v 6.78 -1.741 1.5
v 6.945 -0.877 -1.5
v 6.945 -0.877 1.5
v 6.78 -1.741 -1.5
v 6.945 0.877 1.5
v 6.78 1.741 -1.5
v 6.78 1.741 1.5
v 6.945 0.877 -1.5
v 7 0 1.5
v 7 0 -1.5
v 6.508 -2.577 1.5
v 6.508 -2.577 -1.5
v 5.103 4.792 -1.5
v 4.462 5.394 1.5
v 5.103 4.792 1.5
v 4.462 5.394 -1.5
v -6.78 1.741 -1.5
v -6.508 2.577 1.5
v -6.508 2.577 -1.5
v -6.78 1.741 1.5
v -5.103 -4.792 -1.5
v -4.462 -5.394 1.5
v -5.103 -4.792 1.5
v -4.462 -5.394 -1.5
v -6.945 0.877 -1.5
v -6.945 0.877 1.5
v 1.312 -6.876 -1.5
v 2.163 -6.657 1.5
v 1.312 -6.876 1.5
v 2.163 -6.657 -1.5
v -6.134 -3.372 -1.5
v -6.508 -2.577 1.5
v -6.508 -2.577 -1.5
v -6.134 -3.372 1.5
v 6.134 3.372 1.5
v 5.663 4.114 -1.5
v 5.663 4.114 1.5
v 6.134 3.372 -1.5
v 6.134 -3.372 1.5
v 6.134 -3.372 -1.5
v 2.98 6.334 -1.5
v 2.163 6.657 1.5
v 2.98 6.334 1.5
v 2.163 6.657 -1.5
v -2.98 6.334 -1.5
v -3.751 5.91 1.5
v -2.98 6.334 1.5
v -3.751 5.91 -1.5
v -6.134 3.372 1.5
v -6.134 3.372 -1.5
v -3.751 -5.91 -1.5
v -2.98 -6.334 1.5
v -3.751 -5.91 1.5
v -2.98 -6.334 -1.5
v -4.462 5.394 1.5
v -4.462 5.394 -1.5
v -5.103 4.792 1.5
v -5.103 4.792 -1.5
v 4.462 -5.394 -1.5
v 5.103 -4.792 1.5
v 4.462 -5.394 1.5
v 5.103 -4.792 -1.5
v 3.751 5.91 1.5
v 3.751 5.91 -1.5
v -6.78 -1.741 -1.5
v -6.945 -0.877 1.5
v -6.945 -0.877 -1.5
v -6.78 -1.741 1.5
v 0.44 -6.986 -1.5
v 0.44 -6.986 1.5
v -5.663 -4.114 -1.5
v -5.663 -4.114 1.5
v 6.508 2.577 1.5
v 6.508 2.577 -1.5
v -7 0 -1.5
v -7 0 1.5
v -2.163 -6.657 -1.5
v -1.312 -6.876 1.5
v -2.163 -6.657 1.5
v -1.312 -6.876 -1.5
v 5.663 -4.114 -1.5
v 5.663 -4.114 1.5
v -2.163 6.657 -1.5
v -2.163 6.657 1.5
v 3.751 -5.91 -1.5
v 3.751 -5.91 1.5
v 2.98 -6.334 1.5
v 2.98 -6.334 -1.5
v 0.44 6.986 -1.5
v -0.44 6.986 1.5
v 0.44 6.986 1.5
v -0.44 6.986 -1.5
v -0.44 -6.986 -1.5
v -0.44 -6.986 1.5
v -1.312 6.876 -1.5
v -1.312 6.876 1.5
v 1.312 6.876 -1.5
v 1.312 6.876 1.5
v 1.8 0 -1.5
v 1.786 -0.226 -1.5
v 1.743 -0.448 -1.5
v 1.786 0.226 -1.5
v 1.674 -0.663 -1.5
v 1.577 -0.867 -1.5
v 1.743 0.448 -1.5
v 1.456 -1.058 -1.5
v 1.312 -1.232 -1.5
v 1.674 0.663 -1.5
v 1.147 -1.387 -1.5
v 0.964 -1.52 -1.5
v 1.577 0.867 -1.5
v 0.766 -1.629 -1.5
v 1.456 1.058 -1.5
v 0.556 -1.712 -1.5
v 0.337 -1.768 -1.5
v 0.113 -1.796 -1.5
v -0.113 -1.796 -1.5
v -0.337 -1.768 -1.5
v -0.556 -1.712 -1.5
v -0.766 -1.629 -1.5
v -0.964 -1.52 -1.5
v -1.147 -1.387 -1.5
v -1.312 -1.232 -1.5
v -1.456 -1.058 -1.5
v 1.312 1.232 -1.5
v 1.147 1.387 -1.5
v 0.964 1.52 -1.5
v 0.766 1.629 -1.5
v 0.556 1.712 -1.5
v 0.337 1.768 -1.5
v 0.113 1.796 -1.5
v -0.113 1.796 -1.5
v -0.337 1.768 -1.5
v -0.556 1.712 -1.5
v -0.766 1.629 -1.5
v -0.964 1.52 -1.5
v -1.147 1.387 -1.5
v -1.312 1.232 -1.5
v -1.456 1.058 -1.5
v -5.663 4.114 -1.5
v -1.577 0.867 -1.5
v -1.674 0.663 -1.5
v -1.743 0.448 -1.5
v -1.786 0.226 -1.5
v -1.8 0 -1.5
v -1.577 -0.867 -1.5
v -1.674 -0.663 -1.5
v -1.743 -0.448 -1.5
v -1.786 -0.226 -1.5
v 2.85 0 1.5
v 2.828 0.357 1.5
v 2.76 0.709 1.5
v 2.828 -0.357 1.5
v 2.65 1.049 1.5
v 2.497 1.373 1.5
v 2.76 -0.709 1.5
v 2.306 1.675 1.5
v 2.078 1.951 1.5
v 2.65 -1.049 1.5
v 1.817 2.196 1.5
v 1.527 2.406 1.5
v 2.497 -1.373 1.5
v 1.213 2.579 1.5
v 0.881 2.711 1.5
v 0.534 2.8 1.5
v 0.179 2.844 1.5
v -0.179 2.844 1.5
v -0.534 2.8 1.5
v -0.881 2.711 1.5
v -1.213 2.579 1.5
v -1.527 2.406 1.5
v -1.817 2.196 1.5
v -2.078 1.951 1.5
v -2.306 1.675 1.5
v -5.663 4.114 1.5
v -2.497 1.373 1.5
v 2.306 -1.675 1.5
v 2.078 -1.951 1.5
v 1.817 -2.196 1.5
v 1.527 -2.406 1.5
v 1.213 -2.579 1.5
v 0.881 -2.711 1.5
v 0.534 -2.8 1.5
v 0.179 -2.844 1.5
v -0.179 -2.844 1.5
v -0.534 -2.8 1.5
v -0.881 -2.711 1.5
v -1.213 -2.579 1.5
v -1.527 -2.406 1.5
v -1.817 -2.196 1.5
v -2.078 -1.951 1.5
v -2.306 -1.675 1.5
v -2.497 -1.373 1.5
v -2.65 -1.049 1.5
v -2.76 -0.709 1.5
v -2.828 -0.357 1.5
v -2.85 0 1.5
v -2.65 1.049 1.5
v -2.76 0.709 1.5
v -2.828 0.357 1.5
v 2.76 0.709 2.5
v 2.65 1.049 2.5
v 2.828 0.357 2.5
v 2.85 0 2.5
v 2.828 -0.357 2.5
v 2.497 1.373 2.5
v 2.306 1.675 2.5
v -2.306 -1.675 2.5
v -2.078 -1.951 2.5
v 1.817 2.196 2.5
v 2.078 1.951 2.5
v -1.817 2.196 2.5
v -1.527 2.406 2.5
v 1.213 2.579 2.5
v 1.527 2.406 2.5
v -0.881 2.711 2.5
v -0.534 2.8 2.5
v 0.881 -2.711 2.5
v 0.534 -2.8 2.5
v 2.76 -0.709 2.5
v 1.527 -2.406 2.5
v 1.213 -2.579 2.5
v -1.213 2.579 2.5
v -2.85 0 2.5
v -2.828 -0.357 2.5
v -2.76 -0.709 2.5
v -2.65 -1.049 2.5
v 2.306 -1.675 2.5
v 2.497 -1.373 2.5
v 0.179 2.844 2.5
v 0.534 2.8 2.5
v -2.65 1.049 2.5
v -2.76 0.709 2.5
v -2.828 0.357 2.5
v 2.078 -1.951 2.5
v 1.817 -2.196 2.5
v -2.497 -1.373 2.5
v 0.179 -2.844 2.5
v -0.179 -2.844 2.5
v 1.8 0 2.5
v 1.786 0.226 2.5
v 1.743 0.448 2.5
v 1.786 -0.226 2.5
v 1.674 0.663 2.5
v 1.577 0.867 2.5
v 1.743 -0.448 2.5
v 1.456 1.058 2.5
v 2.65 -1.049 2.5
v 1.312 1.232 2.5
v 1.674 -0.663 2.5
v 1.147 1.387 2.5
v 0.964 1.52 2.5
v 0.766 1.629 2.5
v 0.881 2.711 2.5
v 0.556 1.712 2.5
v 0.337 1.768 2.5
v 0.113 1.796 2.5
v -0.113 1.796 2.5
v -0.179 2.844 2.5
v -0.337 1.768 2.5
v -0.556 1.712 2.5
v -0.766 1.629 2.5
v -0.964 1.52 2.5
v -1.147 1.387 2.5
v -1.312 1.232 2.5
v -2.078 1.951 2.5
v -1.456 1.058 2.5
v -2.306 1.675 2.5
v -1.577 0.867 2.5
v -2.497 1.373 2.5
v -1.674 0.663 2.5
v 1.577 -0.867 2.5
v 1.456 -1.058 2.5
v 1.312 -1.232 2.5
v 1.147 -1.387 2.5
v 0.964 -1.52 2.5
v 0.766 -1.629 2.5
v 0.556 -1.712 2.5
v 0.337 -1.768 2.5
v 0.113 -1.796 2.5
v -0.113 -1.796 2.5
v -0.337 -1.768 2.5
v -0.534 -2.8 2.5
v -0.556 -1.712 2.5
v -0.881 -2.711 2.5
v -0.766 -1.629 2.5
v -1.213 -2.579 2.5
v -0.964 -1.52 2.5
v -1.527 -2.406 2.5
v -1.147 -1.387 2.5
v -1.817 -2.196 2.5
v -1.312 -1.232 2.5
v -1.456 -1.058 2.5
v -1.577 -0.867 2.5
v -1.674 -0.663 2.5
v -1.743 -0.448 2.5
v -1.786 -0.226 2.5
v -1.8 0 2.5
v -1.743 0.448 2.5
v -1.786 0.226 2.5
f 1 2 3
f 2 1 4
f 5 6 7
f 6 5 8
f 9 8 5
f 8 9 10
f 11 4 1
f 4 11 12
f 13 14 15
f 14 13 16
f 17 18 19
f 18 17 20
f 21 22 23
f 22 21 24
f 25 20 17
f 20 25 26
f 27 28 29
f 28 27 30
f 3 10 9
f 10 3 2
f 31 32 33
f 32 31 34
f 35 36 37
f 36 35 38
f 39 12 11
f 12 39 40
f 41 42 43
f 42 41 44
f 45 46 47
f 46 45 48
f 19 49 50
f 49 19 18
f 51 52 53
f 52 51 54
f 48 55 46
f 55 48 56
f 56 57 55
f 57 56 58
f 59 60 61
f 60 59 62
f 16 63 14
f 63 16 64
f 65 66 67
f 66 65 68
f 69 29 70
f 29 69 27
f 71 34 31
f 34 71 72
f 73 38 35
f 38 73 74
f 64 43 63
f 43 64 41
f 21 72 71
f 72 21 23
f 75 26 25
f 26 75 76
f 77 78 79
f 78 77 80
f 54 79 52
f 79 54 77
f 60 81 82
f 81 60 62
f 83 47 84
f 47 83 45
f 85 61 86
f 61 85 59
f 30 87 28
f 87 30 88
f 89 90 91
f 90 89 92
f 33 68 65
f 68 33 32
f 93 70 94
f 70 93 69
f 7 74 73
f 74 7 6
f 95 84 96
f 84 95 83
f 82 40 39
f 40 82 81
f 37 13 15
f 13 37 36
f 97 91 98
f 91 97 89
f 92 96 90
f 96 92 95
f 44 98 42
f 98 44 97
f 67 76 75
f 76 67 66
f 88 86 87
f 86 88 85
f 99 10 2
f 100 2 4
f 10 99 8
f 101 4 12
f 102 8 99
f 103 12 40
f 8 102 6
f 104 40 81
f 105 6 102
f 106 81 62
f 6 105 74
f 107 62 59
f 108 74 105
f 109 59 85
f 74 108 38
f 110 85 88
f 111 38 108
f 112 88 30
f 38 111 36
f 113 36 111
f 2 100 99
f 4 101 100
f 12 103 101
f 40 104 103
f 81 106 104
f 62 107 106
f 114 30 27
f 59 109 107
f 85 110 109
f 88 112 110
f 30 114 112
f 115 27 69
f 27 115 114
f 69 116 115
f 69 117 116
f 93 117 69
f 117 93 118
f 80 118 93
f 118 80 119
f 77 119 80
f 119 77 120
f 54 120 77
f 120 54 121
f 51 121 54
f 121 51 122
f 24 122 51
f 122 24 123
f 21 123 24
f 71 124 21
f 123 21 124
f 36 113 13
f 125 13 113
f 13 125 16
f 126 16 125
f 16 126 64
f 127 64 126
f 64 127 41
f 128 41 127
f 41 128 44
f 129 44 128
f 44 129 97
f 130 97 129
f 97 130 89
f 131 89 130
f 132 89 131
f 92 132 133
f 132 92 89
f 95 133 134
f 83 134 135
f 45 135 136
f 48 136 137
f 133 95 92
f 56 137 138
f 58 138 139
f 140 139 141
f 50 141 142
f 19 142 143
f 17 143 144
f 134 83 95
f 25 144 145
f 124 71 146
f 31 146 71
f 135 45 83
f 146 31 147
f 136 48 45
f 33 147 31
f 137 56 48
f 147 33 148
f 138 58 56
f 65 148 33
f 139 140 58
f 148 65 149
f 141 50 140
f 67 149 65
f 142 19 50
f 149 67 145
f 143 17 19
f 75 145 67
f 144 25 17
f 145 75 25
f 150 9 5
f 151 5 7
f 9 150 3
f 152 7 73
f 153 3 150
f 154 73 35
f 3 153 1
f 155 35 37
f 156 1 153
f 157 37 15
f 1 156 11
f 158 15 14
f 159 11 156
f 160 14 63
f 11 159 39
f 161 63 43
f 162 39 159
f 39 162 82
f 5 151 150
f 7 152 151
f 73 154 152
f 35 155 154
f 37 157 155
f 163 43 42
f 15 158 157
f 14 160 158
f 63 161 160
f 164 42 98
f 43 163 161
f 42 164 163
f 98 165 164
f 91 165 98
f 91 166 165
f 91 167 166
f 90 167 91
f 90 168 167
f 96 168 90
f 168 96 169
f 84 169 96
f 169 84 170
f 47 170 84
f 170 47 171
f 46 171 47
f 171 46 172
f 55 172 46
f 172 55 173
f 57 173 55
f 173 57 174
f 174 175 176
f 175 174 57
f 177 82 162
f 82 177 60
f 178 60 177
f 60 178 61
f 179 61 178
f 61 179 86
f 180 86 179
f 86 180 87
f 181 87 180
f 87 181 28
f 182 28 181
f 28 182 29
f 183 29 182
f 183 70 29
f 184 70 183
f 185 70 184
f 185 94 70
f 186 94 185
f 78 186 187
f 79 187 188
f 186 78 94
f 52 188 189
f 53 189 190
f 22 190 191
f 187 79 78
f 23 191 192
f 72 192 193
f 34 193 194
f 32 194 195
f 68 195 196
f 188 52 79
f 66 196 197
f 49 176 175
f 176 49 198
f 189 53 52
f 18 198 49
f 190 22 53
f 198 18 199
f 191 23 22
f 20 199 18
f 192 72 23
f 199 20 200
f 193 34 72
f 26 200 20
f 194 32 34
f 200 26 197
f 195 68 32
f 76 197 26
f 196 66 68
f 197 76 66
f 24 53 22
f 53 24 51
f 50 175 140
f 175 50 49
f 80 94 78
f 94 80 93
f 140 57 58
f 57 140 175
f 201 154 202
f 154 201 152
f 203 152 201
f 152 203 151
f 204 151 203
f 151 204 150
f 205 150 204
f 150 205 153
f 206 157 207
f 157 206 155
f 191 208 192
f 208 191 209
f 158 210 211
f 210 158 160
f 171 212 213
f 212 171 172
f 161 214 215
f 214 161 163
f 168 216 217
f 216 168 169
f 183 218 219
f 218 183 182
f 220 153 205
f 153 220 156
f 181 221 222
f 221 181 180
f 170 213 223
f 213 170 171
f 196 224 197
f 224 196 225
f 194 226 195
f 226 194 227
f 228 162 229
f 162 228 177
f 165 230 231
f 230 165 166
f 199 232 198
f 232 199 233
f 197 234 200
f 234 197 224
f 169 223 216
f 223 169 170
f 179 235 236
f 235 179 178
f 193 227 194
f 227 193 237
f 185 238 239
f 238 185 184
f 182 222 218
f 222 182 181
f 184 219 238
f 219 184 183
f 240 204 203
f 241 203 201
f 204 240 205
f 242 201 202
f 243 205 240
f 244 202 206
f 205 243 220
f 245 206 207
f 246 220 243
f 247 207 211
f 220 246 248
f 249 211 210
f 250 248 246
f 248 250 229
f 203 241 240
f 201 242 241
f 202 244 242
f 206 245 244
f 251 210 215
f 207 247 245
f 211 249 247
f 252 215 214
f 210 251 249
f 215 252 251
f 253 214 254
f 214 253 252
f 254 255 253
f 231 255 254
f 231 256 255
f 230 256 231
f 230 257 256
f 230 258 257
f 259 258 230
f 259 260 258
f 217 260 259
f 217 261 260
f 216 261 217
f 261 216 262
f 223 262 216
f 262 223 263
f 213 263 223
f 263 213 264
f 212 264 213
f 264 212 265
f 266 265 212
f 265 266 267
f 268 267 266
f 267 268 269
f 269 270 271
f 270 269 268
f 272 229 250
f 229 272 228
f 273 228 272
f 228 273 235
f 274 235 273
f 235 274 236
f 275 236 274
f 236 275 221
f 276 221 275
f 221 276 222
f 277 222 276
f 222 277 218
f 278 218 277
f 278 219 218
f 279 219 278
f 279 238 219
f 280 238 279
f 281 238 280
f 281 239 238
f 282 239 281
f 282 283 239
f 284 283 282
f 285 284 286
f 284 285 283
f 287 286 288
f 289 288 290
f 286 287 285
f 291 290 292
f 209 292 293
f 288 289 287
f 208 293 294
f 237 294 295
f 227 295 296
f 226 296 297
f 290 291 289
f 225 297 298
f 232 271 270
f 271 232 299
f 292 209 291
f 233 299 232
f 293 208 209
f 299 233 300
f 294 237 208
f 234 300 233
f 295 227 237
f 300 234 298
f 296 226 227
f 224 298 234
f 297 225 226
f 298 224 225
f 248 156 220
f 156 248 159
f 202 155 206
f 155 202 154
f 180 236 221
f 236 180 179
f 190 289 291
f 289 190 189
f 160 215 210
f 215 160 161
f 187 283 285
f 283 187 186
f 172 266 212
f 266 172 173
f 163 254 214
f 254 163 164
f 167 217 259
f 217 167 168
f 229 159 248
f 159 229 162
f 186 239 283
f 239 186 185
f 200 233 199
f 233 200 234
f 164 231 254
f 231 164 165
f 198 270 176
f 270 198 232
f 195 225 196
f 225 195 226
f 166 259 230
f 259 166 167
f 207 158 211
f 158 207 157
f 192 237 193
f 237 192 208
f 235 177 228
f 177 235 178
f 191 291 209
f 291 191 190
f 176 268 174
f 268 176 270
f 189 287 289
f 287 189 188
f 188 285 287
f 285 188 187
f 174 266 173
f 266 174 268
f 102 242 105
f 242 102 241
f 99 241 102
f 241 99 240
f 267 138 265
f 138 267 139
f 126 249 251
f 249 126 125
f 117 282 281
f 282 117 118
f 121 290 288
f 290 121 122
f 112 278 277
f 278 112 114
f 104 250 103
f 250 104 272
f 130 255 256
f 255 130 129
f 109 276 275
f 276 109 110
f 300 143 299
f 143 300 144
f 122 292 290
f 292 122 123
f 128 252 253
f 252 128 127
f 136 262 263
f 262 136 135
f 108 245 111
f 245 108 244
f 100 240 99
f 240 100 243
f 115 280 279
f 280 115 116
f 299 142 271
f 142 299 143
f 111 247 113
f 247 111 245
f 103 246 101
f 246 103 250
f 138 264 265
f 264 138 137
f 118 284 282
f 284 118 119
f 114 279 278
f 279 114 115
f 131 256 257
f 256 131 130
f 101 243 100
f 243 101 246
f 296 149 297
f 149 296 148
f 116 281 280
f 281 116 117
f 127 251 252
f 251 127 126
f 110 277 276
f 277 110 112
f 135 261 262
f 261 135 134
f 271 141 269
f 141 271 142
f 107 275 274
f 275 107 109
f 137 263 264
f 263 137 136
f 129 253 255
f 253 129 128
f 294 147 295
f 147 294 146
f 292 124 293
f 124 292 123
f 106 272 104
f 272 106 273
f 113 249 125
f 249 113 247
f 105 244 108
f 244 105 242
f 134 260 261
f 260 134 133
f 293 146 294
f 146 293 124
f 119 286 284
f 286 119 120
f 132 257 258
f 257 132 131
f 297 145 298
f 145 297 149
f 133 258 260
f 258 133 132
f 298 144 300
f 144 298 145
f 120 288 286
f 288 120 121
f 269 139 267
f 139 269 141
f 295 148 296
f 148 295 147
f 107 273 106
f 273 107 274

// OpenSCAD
$fn = 50;


difference() {
	union() {
		translate(v = [0, 0, -1.5000000000]) {
			cylinder(h = 3, r = 7.0000000000);
		}
		translate(v = [0, 0, -1.5000000000]) {
			cylinder(h = 4, r = 2.8500000000);
		}
	}
	union() {
		translate(v = [0, 0, -50.0000000000]) {
			cylinder(h = 100, r = 1.8000000000);
		}
	}
}
